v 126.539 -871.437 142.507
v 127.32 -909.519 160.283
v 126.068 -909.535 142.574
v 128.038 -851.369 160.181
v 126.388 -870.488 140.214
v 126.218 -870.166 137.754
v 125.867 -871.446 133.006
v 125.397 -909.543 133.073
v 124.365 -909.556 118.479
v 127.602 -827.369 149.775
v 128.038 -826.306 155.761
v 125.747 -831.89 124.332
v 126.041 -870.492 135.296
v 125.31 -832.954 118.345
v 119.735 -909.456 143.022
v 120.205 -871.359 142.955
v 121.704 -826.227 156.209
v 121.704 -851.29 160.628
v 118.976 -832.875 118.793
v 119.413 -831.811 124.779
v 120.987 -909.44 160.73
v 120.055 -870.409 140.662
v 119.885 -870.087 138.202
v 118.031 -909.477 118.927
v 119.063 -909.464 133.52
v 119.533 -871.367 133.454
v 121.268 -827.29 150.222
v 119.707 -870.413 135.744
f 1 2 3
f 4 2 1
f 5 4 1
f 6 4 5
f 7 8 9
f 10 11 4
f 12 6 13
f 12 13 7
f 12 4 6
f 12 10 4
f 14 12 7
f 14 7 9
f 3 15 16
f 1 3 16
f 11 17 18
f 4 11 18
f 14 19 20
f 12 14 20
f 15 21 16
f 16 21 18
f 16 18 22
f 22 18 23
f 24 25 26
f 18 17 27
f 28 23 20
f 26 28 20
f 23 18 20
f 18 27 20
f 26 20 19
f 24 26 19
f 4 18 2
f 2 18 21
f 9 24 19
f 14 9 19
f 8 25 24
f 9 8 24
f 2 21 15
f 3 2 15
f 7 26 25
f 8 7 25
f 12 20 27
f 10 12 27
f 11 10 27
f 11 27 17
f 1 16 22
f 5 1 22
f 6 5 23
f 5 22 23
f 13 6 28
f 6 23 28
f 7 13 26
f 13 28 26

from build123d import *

# Parameters (mm, degrees)
BOSS_EXTRUDE1_DEPTH = 6.35


with BuildPart() as part:
    # Sketch1 → Boss-Extrude1 (new body)
    with BuildSketch(Plane(origin=(120.340372588, -1.499994886, -8.506893725), x_dir=(-0.07052518, -0.000878797, -0.997509612), z_dir=(0.997433673, -0.012432614, -0.070508858))):
        with BuildLine():
            Line((-157.673617622, -825.993121633), (-163.677010897, -824.934561423))
            Line((-163.677010897, -824.934561423), (-168.063361205, -850.003924474))
            Line((-168.063361205, -850.003924474), (-168.063361205, -908.15821278))
            Line((-168.063361205, -908.15821278), (-150.310627761, -908.15821278))
            Line((-150.310627761, -908.15821278), (-150.310627761, -870.05821278))
            ThreePointArc((-150.310627761, -870.05821278), (-145.548127761, -868.782104751), (-140.785627761, -870.05821278))
            Line((-140.785627761, -870.05821278), (-140.785627761, -908.15821278))
            Line((-140.785627761, -908.15821278), (-126.155802929, -908.15821278))
            Line((-126.155802929, -908.15821278), (-126.155802929, -831.550562736))
            Line((-126.155802929, -831.550562736), (-132.159196204, -830.492002526))
            Line((-132.159196204, -830.492002526), (-136.538277842, -855.519822856))
            Line((-136.538277842, -855.519822856), (-162.058583421, -851.054571785))
            Line((-162.058583421, -851.054571785), (-157.673617622, -825.993121633))
        make_face()
        Polygon((-132.159196204, -830.492002526), (-157.673617622, -825.993121633), (-162.058583421, -851.054571785), (-136.538277842, -855.519822856), align=None)
    extrude(amount=BOSS_EXTRUDE1_DEPTH)


solid = part.part
